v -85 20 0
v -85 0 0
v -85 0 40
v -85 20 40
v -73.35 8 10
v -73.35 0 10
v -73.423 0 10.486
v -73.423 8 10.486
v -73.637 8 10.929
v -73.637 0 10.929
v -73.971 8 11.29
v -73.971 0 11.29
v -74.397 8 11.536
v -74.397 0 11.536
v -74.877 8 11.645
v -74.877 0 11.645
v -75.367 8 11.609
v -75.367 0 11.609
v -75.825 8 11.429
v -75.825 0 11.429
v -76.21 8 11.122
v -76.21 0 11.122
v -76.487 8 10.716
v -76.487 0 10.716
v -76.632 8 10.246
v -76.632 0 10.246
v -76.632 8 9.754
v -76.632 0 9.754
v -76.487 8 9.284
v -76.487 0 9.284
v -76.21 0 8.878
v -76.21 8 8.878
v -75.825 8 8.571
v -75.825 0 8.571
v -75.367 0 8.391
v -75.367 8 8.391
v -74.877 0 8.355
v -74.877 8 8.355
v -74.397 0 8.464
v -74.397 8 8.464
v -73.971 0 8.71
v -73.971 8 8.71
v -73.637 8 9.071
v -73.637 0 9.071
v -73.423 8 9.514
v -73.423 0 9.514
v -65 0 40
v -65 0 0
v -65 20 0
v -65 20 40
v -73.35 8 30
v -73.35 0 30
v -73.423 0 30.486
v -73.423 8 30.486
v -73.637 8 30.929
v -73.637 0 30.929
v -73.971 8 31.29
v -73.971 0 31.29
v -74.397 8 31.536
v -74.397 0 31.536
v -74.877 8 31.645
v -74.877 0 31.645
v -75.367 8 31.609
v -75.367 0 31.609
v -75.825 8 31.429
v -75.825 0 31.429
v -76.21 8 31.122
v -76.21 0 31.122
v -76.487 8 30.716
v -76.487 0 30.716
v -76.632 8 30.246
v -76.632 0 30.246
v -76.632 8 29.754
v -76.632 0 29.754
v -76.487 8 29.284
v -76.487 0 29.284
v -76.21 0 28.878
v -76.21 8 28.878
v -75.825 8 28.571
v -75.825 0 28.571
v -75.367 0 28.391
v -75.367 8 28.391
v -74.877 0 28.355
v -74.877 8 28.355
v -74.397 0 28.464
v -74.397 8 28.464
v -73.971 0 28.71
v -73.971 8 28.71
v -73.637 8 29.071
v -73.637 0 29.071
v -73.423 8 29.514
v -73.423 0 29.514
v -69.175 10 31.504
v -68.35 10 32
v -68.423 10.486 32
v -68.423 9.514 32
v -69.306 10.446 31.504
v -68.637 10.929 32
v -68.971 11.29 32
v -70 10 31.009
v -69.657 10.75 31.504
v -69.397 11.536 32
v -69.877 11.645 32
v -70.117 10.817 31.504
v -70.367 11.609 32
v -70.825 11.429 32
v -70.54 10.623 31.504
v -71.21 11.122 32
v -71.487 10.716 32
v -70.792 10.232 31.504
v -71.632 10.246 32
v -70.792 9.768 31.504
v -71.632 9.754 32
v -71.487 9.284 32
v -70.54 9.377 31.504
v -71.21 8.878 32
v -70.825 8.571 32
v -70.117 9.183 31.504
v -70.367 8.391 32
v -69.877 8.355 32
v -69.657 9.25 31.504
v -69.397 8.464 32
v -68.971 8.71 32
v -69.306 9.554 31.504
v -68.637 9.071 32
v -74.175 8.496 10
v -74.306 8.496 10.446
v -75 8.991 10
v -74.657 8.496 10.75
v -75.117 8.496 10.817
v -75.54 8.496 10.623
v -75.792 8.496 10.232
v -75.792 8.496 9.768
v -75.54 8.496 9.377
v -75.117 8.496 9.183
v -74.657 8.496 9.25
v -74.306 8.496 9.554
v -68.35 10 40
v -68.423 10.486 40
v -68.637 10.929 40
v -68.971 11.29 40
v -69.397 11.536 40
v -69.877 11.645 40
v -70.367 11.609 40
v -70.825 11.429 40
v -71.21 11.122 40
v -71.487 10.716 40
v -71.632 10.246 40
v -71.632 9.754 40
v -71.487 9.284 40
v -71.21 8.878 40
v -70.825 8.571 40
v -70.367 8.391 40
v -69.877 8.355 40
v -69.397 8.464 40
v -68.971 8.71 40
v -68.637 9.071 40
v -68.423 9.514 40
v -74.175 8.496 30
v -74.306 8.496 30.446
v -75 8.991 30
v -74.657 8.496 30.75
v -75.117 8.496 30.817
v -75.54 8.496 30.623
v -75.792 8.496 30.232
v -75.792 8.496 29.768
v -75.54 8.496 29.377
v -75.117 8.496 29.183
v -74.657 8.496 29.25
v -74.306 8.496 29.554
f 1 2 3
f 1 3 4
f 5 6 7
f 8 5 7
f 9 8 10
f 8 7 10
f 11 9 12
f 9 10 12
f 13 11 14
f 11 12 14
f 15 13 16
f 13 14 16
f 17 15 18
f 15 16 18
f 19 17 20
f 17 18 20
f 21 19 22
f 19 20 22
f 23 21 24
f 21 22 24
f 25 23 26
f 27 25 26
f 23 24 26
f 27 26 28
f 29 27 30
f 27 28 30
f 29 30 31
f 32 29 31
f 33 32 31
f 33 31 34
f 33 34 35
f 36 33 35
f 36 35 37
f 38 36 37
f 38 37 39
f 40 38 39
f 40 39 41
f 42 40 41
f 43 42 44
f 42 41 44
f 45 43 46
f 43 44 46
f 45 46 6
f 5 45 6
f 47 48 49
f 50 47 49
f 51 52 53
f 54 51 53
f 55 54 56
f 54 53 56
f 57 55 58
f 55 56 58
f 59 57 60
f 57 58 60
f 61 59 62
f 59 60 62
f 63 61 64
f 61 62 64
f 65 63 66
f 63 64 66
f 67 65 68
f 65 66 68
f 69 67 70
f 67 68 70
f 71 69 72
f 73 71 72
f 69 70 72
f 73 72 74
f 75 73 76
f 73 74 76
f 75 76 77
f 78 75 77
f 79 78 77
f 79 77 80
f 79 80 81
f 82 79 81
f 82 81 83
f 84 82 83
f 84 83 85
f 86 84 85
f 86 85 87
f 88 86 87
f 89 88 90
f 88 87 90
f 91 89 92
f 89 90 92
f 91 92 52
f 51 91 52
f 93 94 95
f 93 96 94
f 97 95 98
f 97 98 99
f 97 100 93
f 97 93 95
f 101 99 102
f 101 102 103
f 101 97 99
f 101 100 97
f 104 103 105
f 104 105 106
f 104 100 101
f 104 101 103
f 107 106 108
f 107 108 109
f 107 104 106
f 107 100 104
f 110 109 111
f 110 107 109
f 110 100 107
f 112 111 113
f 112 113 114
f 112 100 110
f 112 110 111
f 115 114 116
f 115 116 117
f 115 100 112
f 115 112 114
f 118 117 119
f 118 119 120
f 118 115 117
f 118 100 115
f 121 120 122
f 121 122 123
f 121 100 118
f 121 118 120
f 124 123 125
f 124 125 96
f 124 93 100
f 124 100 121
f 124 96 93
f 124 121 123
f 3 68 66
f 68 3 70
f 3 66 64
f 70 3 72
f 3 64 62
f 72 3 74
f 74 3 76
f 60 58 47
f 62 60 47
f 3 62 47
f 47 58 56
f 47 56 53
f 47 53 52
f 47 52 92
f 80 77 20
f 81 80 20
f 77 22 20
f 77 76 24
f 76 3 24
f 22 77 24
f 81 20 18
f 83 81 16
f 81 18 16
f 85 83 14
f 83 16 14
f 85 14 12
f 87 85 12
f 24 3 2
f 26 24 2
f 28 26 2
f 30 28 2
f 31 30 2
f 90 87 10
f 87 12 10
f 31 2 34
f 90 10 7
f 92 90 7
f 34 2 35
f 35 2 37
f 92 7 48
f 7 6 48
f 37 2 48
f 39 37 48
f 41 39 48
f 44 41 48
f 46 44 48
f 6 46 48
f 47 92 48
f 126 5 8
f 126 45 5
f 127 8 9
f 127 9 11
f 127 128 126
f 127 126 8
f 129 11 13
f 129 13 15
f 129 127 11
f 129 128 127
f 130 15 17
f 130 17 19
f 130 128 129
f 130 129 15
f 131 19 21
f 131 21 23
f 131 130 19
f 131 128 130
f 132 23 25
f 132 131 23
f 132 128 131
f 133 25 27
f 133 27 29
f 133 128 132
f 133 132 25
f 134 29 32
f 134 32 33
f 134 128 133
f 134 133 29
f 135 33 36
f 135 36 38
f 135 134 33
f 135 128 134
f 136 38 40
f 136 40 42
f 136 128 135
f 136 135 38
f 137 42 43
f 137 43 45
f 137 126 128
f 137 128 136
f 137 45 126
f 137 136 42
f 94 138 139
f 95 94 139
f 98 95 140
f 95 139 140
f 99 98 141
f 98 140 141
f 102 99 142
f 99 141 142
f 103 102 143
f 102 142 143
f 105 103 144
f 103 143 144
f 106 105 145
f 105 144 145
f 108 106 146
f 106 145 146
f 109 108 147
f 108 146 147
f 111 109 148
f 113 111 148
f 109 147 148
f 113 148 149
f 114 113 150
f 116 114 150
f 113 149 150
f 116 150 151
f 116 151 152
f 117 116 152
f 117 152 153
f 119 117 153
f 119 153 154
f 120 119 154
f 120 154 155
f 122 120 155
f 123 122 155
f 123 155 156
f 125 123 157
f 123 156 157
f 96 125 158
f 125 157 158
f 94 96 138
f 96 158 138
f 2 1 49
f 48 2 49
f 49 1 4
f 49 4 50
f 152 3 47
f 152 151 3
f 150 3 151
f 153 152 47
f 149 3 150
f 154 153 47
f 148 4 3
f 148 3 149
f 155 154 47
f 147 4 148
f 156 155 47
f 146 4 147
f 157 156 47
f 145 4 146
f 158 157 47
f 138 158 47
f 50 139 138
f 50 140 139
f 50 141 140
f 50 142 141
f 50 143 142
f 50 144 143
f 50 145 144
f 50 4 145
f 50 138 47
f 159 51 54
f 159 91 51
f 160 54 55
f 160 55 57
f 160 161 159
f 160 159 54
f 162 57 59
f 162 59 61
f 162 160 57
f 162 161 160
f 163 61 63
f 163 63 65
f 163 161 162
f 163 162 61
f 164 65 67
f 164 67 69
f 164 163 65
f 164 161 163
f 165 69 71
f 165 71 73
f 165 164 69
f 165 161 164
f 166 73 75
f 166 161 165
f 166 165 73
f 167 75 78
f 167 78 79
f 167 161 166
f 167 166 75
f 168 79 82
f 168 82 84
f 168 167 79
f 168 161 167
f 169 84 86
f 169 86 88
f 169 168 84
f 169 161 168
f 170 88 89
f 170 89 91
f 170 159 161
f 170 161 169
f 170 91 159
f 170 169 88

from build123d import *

# Parameters (mm, degrees)
SKETCH_W       = 20
SKETCH_H       = 20
PAD_DEPTH      = 40
SKETCH001_R    = 1.65
HOLE_DEPTH     = 8
HOLE_TIPS_R    = 1.65
SKETCH002_R    = 1.65
HOLE001_DEPTH  = 8
HOLE001_TIPS_R = 1.65


with BuildPart() as part:
    # Sketch → Pad (new body)
    with BuildSketch(Plane.XY):
        with Locations((-75, 10)):
            Rectangle(SKETCH_W, SKETCH_H)
    extrude(amount=PAD_DEPTH)

    # Sketch001 (on Face1 of Pad) → Hole (cut)
    with BuildSketch(Plane.XZ):
        with Locations((-75, 30)):
            Circle(SKETCH001_R)
        with Locations((-75, 10)):
            Circle(SKETCH001_R)
    extrude(amount=-HOLE_DEPTH, mode=Mode.SUBTRACT)

    # Hole tips → Hole tip 1 section 0
    with BuildSketch(Plane.XZ.offset(-8), mode=Mode.PRIVATE) as hole_tip_1_s0:
        with Locations((-75, 30)):
            Circle(HOLE_TIPS_R)
    loft([hole_tip_1_s0.sketch, Vertex(-75, 8.99142, 30)], mode=Mode.SUBTRACT)

    # Hole tips → Hole tip 2 section 0
    with BuildSketch(Plane.XZ.offset(-8), mode=Mode.PRIVATE) as hole_tip_2_s0:
        with Locations((-75, 10)):
            Circle(HOLE_TIPS_R)
    loft([hole_tip_2_s0.sketch, Vertex(-75, 8.99142, 10)], mode=Mode.SUBTRACT)

    # Sketch002 (on Face4 of Hole) → Hole001 (cut)
    with BuildSketch(Plane.XY.offset(40)):
        with Locations((-70, 10)):
            Circle(SKETCH002_R)
    extrude(amount=-HOLE001_DEPTH, mode=Mode.SUBTRACT)

    # Hole001 tips → Hole001 tip 1 section 0
    with BuildSketch(Plane.XY.offset(32), mode=Mode.PRIVATE) as hole001_tip_1_s0:
        with Locations((-70, 10)):
            Circle(HOLE001_TIPS_R)
    loft([hole001_tip_1_s0.sketch, Vertex(-70, 10, 31.00858)], mode=Mode.SUBTRACT)


solid = part.part
